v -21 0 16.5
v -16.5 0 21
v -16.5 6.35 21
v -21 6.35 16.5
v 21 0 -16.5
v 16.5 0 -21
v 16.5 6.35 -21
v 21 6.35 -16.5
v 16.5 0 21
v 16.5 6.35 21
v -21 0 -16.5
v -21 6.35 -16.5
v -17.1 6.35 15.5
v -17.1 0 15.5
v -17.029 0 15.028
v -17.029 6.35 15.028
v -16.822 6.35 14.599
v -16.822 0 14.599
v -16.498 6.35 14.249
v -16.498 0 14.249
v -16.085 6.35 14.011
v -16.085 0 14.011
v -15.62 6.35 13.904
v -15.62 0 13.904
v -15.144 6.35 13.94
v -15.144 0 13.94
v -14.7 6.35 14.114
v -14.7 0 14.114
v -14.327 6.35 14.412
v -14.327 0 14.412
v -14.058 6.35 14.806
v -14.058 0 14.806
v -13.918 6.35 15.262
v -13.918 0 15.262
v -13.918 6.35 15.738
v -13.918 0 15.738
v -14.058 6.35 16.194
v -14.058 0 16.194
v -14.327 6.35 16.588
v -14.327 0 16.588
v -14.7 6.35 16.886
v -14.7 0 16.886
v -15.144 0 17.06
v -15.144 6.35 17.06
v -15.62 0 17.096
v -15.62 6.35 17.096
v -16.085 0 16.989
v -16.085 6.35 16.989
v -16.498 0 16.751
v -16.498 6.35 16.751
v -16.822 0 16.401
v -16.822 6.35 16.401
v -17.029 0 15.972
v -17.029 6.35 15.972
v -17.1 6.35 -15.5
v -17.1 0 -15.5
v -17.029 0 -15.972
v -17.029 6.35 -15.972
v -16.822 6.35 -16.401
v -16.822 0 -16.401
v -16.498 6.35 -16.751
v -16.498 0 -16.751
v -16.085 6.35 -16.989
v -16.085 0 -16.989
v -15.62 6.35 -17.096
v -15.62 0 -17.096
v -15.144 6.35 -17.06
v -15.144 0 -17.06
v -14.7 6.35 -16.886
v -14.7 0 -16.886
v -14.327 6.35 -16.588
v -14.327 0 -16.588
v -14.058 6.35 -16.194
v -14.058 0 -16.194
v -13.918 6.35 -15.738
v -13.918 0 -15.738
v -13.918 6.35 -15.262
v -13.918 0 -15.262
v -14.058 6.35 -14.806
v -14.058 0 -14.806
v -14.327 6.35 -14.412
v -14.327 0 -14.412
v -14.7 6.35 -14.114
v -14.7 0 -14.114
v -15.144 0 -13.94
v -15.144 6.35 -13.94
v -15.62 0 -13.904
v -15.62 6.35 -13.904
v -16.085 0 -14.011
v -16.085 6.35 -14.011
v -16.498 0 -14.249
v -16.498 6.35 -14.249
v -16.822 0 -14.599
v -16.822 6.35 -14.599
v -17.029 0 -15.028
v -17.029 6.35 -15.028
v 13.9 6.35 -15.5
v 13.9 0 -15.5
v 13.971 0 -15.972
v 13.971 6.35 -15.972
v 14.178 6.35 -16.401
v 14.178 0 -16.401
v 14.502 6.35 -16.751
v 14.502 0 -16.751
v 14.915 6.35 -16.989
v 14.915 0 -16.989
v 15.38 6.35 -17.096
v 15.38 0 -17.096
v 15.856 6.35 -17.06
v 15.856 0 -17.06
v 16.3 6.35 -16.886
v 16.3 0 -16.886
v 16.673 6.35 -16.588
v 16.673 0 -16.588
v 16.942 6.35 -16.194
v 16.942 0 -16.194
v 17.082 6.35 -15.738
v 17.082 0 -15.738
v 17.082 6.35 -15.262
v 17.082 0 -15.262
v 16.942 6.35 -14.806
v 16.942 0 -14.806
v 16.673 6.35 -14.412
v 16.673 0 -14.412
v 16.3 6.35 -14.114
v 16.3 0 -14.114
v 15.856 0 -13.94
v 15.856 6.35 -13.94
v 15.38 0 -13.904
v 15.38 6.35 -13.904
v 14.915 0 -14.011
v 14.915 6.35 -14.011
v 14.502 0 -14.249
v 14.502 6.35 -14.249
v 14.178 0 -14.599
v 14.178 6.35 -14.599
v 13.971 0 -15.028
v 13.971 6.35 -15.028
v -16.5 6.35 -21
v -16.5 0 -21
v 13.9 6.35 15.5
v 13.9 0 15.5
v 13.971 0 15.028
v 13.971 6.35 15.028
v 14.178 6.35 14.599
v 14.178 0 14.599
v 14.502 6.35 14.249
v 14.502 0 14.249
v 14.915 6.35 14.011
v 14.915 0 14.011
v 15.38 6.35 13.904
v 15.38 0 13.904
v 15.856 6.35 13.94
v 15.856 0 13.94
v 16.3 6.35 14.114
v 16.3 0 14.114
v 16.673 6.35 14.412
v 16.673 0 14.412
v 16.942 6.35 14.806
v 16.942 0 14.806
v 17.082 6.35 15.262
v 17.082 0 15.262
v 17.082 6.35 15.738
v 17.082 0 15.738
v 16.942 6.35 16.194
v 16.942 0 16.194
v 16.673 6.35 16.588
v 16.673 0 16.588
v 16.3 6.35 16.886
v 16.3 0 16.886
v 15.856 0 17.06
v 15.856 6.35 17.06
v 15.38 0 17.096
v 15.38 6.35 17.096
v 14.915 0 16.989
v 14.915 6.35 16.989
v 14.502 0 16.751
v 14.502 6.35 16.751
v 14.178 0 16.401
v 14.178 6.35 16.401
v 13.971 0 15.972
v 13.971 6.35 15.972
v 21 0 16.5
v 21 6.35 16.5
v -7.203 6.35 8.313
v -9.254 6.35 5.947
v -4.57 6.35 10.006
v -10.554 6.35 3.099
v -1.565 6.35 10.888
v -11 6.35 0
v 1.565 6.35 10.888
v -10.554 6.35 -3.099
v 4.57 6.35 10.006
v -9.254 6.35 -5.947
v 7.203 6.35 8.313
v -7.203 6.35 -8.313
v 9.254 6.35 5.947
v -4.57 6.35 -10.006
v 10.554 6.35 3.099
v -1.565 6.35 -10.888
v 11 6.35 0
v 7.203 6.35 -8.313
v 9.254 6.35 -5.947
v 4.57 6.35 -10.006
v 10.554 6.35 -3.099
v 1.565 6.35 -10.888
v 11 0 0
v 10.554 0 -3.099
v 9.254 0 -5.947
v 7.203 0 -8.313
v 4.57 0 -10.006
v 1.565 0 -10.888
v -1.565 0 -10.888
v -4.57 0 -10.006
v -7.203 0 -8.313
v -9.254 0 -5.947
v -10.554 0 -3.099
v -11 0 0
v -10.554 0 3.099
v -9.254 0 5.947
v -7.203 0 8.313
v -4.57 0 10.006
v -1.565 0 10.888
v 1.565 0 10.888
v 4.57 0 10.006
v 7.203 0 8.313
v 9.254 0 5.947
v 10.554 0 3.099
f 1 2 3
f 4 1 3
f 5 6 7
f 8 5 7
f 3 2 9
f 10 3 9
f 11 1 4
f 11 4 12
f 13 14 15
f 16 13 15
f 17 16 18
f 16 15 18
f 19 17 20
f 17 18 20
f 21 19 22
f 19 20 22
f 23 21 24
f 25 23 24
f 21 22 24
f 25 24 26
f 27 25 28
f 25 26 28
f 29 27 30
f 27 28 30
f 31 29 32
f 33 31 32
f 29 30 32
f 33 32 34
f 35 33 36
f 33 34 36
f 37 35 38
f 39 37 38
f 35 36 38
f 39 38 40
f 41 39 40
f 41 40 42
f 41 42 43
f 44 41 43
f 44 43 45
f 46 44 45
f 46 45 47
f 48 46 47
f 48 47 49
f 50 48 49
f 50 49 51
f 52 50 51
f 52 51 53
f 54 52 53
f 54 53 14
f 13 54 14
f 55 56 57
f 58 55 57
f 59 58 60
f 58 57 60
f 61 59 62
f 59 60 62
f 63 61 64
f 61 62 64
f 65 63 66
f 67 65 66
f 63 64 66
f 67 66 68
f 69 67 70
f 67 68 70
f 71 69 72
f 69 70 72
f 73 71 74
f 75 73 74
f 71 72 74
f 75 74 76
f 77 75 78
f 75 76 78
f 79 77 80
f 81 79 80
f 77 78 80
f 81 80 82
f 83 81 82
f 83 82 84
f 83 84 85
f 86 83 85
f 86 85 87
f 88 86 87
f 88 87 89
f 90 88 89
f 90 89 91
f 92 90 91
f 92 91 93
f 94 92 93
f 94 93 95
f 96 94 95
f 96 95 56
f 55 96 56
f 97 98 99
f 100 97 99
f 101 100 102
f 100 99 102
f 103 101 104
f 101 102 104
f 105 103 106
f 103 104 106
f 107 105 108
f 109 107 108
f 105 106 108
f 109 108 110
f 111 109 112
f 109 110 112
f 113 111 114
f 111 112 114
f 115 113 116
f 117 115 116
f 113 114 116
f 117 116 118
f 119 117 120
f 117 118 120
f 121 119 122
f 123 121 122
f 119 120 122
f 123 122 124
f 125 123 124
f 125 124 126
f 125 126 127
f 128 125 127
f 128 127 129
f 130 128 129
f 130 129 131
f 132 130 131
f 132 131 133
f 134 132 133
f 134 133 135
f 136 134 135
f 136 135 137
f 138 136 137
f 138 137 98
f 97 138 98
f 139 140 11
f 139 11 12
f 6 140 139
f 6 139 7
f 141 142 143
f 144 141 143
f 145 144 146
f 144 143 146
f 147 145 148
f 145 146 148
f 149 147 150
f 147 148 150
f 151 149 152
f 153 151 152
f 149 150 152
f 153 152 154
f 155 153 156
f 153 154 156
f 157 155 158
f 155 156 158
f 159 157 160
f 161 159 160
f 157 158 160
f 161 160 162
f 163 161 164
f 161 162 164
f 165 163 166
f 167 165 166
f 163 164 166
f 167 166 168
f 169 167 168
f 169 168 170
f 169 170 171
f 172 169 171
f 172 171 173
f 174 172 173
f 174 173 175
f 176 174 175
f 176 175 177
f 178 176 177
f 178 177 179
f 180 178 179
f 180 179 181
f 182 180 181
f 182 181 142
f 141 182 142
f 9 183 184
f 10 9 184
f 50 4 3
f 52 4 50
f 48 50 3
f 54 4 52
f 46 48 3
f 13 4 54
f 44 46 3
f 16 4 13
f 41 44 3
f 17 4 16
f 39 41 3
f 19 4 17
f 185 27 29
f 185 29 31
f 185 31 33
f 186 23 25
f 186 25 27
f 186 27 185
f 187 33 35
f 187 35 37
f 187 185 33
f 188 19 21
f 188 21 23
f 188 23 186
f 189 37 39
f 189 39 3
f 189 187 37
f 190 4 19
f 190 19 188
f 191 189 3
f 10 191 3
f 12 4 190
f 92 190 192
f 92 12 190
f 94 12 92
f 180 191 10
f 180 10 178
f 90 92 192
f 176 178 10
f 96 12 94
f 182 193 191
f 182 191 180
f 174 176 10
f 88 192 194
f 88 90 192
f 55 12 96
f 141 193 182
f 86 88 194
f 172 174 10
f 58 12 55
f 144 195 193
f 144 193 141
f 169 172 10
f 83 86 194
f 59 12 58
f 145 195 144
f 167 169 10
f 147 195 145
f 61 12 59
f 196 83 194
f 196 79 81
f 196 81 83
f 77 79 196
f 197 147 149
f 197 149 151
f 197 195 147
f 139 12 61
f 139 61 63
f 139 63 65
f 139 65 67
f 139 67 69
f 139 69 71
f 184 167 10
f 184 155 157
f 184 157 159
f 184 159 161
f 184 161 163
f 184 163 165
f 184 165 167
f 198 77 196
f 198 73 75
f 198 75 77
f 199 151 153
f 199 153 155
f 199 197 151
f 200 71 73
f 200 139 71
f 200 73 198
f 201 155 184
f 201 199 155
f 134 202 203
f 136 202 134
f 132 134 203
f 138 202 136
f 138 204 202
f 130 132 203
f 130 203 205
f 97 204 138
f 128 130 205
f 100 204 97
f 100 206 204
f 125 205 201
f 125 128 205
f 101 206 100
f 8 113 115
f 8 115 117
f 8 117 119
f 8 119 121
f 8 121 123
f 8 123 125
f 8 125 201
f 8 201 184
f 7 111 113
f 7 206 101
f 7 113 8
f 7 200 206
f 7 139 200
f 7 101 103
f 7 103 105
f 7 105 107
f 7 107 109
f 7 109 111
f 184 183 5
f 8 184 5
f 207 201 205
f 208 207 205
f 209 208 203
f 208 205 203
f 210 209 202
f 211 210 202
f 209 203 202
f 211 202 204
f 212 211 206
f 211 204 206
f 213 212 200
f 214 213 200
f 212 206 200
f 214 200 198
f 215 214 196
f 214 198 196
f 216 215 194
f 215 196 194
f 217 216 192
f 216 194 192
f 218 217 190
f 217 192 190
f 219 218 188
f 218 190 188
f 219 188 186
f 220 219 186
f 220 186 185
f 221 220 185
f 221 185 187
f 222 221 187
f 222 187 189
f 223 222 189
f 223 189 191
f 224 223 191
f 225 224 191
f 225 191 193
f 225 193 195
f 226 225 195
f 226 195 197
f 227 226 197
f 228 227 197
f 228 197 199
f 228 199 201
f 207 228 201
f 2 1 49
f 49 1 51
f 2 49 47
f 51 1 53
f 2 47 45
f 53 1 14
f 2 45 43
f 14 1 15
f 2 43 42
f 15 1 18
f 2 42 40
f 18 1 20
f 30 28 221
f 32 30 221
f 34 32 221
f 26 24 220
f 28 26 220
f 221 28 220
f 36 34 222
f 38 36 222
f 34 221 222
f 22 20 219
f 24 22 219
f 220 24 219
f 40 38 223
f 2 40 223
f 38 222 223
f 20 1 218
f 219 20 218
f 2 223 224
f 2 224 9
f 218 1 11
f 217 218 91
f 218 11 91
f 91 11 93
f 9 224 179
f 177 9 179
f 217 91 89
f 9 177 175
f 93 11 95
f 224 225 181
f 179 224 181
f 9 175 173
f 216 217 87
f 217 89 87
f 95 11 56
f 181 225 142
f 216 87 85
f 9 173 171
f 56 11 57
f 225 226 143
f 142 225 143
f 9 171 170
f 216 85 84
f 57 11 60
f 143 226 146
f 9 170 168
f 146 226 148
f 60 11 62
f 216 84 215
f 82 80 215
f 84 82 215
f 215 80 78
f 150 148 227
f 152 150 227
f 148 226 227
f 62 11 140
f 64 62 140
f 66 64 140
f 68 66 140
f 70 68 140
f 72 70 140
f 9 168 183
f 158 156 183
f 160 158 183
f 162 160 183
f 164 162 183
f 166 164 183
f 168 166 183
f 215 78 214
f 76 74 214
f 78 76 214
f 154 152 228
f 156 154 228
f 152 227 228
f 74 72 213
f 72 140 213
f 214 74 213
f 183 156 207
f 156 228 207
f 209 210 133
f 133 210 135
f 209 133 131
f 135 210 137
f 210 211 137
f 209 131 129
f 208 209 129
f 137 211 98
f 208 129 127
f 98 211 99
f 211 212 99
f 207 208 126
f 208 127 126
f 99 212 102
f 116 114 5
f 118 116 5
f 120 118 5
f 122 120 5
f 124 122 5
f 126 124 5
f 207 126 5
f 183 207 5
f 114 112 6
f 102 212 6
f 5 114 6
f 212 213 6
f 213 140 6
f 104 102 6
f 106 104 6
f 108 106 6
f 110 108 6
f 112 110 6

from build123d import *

# Parameters (mm, degrees)
SKETCH1_W            = 42
SKETCH1_H            = 42
BOSS_EXTRUDE1_DEPTH  = 6.35
CHAMFER1_SIZE        = 4.5
M3_CLEARANCE_HOLE1_D = 3.2
SKETCH6_R            = 11
CUT_EXTRUDE1_DEPTH   = 7.35


with BuildPart() as part:
    # Sketch1 → Boss-Extrude1 (new body)
    with BuildSketch(Plane(origin=(0, 0, 0), x_dir=(1, 0, 0), z_dir=(0, 1, 0))):
        Rectangle(SKETCH1_W, SKETCH1_H)
    extrude(amount=BOSS_EXTRUDE1_DEPTH)

    # Chamfer1
    chamfer1_edges = [part.edges().sort_by_distance(p)[0] for p in [
        (-21, 3.175, 21),
        (-21, 3.175, -21),
        (21, 3.175, -21),
        (21, 3.175, 21),
    ]]
    chamfer(chamfer1_edges, length=CHAMFER1_SIZE)

    # M3 Clearance Hole1 (through all)
    with Locations(Plane(origin=(0, 6.35, 0), x_dir=(1, 0, 0), z_dir=(0, 1, 0))):
        with Locations((-15.5, 15.5), (-15.5, -15.5), (15.5, -15.5), (15.5, 15.5)):
            Hole(M3_CLEARANCE_HOLE1_D / 2)

    # Sketch6 → Cut-Extrude1 (cut, through all)
    with BuildSketch(Plane(origin=(0, 6.35, 0), x_dir=(1, 0, 0), z_dir=(0, 1, 0))):
        Circle(SKETCH6_R)
    extrude(amount=-CUT_EXTRUDE1_DEPTH, mode=Mode.SUBTRACT)


solid = part.part
